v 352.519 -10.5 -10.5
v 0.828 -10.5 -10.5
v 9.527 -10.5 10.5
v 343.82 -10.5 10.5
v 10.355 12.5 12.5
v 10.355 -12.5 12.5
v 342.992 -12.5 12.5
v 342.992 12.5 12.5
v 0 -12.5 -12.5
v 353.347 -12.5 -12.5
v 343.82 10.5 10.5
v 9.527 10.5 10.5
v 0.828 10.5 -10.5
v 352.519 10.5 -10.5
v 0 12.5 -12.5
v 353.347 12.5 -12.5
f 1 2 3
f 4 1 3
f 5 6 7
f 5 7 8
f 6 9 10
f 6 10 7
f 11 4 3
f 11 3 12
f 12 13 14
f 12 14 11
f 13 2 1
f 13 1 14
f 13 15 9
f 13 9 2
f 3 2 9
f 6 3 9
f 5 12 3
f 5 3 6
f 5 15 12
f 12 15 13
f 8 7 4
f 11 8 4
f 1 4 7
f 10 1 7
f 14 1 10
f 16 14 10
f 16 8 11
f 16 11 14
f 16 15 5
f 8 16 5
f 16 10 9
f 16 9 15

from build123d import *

# Parameters (mm, degrees)
F0_W        = 25
F0_H        = 25
F0_W_2      = 21
F0_H_2      = 21
F1_DEPTH    = 353.347
F2_T1_DEPTH = 154.6335196453
F3_T1_DEPTH = 154.6335196453


# Not quite as in the source:
# - a fillet or chamfer that OpenCascade refuses, or shapes differently, is made with other operations: its cross-section is extruded or revolved along the edge and cut away or added


with BuildPart() as f1:
    # F0 (on Right) → F1 (new body)
    with BuildSketch(Plane.YZ):
        Rectangle(F0_W, F0_H)
        Rectangle(F0_W_2, F0_H_2, mode=Mode.SUBTRACT)
    extrude(amount=F1_DEPTH)

    # F2: chamfer of 25 x 10.3553390593 on 1 edges, made by hand

    # F2_s2 → F2_t1 (cut)
    with BuildSketch(Plane.XZ.offset(-77.3167598227)):
        Polygon((342.9916609407, 12.5), (353.347, -12.5), (353.347, 12.5), align=None)
    extrude(amount=F2_T1_DEPTH, mode=Mode.SUBTRACT)

    # F3: chamfer of 25 x 10.3553390593 on 1 edges, made by hand

    # F3_s2 → F3_t1 (cut)
    with BuildSketch(Plane.XZ.offset(-77.3167598227)):
        Polygon((0, -12.5), (10.3553390593, 12.5), (0, 12.5), align=None)
    extrude(amount=F3_T1_DEPTH, mode=Mode.SUBTRACT)


solid = f1.part
